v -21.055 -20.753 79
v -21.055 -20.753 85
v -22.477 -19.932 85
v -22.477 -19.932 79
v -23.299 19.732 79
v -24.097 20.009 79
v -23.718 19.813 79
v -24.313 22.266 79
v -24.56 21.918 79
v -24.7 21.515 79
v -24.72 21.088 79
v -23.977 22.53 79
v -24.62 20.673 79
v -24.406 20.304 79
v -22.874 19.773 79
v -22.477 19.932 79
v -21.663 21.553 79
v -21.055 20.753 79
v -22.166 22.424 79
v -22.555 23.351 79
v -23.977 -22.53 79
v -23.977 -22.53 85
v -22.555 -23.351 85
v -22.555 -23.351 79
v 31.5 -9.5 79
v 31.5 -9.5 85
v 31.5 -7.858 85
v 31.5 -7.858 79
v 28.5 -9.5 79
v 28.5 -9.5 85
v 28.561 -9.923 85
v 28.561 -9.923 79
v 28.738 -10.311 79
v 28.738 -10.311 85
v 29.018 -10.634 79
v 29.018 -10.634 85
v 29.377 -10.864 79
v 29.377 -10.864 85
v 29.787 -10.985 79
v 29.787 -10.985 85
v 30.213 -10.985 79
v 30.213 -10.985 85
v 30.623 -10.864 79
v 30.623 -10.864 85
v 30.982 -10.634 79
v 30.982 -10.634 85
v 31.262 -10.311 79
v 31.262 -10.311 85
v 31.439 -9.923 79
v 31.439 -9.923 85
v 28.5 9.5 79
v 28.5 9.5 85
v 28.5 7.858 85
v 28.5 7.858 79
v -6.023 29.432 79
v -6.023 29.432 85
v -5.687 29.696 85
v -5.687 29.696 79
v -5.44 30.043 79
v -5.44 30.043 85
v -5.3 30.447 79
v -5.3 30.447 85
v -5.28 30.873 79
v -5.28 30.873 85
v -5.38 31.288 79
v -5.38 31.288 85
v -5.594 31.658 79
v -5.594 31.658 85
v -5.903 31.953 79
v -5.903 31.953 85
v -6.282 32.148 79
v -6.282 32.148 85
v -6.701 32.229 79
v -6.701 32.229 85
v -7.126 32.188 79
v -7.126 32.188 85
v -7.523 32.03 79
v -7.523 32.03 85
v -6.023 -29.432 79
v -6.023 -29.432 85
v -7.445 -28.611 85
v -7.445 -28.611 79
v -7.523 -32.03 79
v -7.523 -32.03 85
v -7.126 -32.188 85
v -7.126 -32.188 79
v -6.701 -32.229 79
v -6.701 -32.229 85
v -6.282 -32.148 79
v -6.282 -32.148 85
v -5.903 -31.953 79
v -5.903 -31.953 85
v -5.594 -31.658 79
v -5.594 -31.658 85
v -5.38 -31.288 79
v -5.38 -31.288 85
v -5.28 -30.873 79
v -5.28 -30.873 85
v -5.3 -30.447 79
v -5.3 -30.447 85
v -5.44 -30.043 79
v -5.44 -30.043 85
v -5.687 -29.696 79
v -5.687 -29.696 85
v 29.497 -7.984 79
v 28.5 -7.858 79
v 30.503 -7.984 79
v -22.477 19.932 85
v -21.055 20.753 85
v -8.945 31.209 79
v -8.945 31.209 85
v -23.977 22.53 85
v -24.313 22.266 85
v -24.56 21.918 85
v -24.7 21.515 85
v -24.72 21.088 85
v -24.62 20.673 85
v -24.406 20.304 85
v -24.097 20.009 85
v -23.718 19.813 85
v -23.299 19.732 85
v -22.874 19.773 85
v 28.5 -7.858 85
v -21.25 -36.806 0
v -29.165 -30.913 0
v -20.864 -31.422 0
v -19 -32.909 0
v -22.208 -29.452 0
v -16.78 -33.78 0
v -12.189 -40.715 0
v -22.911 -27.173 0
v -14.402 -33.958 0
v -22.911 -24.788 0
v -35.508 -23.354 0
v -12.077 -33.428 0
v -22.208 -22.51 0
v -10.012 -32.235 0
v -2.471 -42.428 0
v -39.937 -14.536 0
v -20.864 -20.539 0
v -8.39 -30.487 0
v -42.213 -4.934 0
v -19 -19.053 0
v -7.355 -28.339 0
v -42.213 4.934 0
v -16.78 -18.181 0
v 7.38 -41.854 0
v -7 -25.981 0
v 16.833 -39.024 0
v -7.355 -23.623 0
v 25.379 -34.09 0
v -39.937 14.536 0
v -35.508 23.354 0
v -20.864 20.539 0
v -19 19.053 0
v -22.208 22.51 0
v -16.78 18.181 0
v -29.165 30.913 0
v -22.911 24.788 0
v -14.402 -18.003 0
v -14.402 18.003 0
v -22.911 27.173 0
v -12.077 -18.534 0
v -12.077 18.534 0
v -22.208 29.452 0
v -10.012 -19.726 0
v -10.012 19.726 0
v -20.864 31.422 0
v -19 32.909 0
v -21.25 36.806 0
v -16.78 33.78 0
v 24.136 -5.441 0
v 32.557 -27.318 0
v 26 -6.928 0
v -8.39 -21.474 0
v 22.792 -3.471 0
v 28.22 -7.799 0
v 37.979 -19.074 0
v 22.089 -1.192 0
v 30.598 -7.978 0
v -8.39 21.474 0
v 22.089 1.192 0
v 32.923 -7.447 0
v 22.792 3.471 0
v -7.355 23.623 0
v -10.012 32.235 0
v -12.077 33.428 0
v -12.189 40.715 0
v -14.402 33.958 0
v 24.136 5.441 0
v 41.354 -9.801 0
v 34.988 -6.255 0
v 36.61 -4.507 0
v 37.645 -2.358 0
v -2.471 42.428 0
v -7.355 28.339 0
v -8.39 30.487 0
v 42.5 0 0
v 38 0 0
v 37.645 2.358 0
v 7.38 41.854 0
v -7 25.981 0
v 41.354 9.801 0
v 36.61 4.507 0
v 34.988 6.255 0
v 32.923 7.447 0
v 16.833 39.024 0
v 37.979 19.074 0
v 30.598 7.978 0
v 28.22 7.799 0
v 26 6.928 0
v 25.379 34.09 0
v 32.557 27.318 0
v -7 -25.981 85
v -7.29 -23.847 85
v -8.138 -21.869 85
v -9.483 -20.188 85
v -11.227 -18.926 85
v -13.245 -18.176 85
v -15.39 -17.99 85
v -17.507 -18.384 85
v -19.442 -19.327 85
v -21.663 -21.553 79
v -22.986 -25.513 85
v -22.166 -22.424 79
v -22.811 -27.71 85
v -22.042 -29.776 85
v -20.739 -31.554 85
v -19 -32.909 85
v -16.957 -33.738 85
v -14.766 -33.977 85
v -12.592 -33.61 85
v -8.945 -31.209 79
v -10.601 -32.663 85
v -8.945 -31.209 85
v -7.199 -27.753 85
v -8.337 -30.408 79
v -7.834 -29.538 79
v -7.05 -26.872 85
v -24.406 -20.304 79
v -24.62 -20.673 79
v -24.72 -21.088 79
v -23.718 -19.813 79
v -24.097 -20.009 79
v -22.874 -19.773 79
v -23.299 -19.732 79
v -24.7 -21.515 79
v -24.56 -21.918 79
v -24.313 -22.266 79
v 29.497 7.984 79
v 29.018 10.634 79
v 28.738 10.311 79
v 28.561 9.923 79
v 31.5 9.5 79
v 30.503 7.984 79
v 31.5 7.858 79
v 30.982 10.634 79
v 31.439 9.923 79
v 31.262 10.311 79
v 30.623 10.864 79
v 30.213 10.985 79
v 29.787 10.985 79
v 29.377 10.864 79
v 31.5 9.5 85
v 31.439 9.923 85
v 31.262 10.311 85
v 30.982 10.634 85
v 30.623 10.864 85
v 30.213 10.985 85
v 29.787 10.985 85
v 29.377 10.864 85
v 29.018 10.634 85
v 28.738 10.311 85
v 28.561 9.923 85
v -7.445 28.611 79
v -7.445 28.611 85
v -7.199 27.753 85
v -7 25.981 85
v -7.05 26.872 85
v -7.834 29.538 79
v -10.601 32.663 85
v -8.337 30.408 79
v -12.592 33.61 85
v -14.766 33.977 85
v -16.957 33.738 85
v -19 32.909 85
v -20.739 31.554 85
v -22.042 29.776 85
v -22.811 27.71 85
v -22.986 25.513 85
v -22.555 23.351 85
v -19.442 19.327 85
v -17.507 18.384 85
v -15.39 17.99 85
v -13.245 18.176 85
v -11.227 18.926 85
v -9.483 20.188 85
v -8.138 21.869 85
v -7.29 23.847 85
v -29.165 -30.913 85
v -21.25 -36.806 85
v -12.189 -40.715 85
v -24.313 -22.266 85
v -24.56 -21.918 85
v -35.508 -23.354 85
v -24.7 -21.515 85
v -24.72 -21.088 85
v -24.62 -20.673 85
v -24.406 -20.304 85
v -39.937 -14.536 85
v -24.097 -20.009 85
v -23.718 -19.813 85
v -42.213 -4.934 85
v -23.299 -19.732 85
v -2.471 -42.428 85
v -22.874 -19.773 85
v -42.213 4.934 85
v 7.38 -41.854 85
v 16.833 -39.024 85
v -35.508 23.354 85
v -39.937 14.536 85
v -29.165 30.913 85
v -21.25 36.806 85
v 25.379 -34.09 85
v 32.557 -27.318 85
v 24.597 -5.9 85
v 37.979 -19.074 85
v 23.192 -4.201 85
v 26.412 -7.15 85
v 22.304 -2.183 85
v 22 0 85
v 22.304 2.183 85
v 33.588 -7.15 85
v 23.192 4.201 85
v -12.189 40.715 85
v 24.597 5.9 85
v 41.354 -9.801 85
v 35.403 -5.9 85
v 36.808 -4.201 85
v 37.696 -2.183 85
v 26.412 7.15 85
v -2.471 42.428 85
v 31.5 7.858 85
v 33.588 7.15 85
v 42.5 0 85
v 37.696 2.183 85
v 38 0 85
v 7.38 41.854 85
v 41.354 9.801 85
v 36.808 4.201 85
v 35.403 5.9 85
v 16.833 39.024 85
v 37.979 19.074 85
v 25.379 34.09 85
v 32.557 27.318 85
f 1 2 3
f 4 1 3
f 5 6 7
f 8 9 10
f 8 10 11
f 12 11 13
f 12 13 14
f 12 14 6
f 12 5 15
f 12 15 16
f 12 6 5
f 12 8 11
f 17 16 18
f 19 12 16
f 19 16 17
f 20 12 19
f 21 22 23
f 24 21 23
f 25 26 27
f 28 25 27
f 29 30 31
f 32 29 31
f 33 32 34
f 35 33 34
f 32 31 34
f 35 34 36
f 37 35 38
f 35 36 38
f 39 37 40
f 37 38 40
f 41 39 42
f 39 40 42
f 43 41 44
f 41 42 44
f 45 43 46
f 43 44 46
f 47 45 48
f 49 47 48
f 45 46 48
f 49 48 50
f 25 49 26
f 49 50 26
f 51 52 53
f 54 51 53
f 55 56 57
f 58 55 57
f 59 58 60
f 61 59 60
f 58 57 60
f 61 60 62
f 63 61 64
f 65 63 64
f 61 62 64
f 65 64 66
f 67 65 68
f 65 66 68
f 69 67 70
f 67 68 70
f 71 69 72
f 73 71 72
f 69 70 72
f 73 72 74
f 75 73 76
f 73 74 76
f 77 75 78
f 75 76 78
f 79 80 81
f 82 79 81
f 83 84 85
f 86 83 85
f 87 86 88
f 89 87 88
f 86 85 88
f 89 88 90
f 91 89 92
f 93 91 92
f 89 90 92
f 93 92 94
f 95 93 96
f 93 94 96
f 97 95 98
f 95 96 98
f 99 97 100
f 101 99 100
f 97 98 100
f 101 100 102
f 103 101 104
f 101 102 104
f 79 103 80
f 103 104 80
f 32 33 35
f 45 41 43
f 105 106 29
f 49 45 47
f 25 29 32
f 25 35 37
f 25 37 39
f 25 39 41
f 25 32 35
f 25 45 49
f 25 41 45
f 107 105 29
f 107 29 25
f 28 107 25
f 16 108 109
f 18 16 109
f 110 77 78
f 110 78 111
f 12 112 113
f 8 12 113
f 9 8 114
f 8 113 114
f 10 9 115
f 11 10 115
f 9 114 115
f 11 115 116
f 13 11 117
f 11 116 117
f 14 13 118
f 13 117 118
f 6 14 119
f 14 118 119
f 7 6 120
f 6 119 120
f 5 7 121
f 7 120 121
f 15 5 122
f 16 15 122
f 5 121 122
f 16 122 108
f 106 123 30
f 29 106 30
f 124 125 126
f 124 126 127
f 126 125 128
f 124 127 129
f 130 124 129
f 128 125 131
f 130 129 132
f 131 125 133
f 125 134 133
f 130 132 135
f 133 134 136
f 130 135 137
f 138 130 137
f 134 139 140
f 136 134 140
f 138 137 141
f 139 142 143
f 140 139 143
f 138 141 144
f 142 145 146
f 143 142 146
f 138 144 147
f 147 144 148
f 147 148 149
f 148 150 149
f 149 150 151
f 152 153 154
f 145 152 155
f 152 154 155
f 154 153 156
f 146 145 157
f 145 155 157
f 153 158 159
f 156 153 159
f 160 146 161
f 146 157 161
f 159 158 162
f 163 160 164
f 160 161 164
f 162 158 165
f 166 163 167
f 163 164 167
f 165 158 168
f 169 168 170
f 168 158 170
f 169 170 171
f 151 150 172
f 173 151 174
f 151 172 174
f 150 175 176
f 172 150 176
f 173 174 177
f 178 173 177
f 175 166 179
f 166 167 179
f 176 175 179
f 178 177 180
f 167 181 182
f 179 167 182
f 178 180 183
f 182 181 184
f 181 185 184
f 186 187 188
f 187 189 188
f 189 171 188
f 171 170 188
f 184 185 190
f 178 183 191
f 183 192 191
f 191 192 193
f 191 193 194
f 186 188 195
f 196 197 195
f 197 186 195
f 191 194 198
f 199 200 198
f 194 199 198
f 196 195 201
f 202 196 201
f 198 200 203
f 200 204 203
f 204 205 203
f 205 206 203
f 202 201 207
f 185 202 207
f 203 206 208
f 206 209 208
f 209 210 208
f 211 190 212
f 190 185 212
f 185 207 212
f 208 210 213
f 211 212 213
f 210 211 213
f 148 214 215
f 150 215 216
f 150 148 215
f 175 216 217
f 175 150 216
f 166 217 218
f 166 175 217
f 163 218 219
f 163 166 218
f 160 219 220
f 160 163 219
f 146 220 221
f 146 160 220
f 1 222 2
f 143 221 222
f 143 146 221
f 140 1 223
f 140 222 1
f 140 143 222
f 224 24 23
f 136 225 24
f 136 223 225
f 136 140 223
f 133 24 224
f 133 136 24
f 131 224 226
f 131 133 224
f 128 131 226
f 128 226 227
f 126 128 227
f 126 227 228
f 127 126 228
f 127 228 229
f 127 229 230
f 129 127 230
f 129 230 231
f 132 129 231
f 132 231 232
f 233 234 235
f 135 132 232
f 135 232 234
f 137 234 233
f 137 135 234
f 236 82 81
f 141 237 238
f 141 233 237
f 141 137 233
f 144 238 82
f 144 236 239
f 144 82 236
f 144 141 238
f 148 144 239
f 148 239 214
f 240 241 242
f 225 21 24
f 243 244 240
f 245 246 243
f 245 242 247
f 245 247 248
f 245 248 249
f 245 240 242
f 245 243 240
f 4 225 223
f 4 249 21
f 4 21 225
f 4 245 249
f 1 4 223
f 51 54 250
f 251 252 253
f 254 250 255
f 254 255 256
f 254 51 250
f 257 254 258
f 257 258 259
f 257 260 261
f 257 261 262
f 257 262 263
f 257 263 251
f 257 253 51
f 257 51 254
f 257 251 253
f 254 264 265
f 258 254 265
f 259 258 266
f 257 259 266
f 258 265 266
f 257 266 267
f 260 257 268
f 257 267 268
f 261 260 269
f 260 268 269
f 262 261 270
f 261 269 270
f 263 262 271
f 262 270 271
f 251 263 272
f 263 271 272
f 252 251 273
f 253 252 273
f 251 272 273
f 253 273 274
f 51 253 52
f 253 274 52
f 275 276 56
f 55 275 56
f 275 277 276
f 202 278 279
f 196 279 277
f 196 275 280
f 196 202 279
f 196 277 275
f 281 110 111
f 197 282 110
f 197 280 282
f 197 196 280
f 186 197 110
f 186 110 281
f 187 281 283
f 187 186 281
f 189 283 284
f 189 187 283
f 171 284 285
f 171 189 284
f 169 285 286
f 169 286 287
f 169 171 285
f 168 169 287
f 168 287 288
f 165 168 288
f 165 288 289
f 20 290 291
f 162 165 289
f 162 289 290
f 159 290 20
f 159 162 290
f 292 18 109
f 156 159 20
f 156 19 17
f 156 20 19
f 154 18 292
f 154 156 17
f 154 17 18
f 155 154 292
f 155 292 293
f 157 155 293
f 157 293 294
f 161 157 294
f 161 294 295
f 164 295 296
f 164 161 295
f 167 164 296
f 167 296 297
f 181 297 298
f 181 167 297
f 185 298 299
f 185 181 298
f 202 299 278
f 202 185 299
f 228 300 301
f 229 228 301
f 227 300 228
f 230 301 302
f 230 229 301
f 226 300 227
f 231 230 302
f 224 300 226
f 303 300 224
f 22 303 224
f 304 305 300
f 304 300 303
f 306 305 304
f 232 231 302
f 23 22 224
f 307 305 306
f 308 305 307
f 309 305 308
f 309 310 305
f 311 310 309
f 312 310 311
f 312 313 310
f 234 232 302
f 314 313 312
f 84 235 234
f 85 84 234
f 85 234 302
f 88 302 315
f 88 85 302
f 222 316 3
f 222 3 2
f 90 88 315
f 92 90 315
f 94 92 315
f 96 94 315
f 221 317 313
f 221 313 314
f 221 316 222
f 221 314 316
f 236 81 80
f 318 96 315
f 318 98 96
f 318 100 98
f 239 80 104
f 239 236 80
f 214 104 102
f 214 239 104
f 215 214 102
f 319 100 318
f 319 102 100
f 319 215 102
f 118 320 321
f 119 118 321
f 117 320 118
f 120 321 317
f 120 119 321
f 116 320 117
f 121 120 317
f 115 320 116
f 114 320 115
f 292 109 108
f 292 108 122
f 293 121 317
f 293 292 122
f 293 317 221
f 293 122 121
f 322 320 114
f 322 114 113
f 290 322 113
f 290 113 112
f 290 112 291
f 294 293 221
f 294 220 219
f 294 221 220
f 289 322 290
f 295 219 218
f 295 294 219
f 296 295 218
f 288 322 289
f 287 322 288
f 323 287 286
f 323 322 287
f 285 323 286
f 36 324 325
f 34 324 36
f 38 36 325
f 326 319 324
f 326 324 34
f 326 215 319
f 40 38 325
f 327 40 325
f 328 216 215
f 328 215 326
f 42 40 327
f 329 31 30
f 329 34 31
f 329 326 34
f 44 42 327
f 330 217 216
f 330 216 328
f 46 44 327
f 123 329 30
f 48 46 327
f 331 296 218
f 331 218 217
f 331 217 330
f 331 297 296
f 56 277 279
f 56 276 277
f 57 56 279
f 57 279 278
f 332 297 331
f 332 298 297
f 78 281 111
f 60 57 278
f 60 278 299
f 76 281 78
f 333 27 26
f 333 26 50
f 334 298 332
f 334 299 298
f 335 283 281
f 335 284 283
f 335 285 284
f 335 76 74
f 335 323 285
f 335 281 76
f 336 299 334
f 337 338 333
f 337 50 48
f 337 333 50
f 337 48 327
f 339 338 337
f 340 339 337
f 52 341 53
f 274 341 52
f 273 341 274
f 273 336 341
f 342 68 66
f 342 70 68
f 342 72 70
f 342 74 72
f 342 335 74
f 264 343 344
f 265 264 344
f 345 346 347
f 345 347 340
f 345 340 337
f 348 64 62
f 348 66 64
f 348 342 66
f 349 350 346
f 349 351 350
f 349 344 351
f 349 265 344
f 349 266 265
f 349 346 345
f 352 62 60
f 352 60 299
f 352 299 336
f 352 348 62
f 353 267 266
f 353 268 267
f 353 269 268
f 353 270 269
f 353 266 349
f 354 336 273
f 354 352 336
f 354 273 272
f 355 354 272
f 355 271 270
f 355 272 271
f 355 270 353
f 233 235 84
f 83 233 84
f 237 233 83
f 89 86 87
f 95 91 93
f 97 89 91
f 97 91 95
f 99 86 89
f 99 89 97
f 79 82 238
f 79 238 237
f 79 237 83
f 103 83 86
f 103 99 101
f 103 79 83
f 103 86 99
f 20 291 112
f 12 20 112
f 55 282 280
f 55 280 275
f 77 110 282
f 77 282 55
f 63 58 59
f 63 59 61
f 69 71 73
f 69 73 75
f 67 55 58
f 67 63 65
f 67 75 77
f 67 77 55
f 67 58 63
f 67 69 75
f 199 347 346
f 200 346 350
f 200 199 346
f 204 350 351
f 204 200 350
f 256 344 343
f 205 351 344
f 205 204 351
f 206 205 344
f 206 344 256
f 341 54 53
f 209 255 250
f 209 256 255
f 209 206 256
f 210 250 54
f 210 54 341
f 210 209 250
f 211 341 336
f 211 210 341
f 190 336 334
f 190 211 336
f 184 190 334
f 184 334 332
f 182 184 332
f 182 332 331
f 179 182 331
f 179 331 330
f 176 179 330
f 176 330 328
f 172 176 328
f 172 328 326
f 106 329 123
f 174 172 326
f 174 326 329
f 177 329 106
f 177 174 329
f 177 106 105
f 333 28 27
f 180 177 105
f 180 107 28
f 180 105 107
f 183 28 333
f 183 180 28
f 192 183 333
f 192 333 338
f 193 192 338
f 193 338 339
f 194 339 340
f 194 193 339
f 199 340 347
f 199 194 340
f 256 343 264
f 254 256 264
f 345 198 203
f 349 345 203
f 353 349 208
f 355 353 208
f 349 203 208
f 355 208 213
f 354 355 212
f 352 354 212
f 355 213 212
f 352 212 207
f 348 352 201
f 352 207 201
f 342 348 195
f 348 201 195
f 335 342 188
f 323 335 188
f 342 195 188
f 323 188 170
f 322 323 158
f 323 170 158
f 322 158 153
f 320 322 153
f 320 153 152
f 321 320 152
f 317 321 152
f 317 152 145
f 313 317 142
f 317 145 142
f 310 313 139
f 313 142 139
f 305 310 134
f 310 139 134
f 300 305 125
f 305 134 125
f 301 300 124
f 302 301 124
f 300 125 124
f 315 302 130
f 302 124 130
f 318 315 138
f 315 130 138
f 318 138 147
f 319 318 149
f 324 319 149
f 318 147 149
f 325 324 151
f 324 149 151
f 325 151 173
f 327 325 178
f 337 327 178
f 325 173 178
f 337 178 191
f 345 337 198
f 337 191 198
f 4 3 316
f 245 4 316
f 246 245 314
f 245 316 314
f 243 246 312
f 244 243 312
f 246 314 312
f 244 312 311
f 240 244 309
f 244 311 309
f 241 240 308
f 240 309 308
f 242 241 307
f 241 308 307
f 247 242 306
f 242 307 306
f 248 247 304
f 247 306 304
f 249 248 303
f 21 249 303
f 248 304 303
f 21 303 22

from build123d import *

# Parameters (mm, degrees)
F0_R     = 42.5
F0_R_2   = 8
F1_DEPTH = 85
F3_DEPTH = 6


with BuildPart() as f1:
    # F0 (on Top) → F1 (new body)
    with BuildSketch(Plane.XY):
        Circle(F0_R)
        with Locations((-15, -25.9807621135)):
            Circle(F0_R_2, mode=Mode.SUBTRACT)
        with Locations((-15, 25.9807621135)):
            Circle(F0_R_2, mode=Mode.SUBTRACT)
        with Locations((30, 0)):
            Circle(F0_R_2, mode=Mode.SUBTRACT)
    extrude(amount=F1_DEPTH)

    # F2 (on face) → F3 (cut)
    with BuildSketch(Plane.XY.offset(85)):
        with BuildLine():
            ThreePointArc((28.5, 7.8581168228), (30, 8), (31.5, 7.8581168228))
            Line((31.5, 7.8581168228), (31.5, 9.5))
            ThreePointArc((31.5, 9.5), (30, 11), (28.5, 9.5))
            Line((28.5, 9.5), (28.5, 7.8581168228))
        make_face()
        with BuildLine():
            Line((31.5, -9.5), (31.5, -7.8581168228))
            ThreePointArc((31.5, -7.8581168228), (30, -8), (28.5, -7.8581168228))
            Line((28.5, -7.8581168228), (28.5, -9.5))
            ThreePointArc((28.5, -9.5), (30, -11), (31.5, -9.5))
        make_face()
        with BuildLine():
            Line((-8.9446712056, -31.2088586306), (-7.522758664, -32.0298002192))
            ThreePointArc((-7.522758664, -32.0298002192), (-5.4737205584, -31.4807621135), (-6.022758664, -29.4317240079))
            Line((-6.022758664, -29.4317240079), (-7.4446712056, -28.6107824192))
            ThreePointArc((-7.4446712056, -28.6107824192), (-8.0717967697, -29.9807621135), (-8.9446712056, -31.2088586306))
        make_face()
        with BuildLine():
            Line((-23.977241336, -22.5298002192), (-22.5553287944, -23.3507418078))
            ThreePointArc((-22.5553287944, -23.3507418078), (-21.9282032303, -21.9807621135), (-21.0553287944, -20.7526655965))
            Line((-21.0553287944, -20.7526655965), (-22.477241336, -19.9317240079))
            ThreePointArc((-22.477241336, -19.9317240079), (-24.5262794416, -20.4807621135), (-23.977241336, -22.5298002192))
        make_face()
        with BuildLine():
            Line((-22.5553287944, 23.3507418078), (-23.977241336, 22.5298002192))
            ThreePointArc((-23.977241336, 22.5298002192), (-24.5262794416, 20.4807621135), (-22.477241336, 19.9317240079))
            Line((-22.477241336, 19.9317240079), (-21.0553287944, 20.7526655965))
            ThreePointArc((-21.0553287944, 20.7526655965), (-21.9282032303, 21.9807621135), (-22.5553287944, 23.3507418078))
        make_face()
        with BuildLine():
            Line((-7.522758664, 32.0298002192), (-8.9446712056, 31.2088586306))
            ThreePointArc((-8.9446712056, 31.2088586306), (-8.0717967697, 29.9807621135), (-7.4446712056, 28.6107824192))
            Line((-7.4446712056, 28.6107824192), (-6.022758664, 29.4317240079))
            ThreePointArc((-6.022758664, 29.4317240079), (-5.4737205584, 31.4807621135), (-7.522758664, 32.0298002192))
        make_face()
    extrude(amount=-F3_DEPTH, mode=Mode.SUBTRACT)


solid = f1.part
